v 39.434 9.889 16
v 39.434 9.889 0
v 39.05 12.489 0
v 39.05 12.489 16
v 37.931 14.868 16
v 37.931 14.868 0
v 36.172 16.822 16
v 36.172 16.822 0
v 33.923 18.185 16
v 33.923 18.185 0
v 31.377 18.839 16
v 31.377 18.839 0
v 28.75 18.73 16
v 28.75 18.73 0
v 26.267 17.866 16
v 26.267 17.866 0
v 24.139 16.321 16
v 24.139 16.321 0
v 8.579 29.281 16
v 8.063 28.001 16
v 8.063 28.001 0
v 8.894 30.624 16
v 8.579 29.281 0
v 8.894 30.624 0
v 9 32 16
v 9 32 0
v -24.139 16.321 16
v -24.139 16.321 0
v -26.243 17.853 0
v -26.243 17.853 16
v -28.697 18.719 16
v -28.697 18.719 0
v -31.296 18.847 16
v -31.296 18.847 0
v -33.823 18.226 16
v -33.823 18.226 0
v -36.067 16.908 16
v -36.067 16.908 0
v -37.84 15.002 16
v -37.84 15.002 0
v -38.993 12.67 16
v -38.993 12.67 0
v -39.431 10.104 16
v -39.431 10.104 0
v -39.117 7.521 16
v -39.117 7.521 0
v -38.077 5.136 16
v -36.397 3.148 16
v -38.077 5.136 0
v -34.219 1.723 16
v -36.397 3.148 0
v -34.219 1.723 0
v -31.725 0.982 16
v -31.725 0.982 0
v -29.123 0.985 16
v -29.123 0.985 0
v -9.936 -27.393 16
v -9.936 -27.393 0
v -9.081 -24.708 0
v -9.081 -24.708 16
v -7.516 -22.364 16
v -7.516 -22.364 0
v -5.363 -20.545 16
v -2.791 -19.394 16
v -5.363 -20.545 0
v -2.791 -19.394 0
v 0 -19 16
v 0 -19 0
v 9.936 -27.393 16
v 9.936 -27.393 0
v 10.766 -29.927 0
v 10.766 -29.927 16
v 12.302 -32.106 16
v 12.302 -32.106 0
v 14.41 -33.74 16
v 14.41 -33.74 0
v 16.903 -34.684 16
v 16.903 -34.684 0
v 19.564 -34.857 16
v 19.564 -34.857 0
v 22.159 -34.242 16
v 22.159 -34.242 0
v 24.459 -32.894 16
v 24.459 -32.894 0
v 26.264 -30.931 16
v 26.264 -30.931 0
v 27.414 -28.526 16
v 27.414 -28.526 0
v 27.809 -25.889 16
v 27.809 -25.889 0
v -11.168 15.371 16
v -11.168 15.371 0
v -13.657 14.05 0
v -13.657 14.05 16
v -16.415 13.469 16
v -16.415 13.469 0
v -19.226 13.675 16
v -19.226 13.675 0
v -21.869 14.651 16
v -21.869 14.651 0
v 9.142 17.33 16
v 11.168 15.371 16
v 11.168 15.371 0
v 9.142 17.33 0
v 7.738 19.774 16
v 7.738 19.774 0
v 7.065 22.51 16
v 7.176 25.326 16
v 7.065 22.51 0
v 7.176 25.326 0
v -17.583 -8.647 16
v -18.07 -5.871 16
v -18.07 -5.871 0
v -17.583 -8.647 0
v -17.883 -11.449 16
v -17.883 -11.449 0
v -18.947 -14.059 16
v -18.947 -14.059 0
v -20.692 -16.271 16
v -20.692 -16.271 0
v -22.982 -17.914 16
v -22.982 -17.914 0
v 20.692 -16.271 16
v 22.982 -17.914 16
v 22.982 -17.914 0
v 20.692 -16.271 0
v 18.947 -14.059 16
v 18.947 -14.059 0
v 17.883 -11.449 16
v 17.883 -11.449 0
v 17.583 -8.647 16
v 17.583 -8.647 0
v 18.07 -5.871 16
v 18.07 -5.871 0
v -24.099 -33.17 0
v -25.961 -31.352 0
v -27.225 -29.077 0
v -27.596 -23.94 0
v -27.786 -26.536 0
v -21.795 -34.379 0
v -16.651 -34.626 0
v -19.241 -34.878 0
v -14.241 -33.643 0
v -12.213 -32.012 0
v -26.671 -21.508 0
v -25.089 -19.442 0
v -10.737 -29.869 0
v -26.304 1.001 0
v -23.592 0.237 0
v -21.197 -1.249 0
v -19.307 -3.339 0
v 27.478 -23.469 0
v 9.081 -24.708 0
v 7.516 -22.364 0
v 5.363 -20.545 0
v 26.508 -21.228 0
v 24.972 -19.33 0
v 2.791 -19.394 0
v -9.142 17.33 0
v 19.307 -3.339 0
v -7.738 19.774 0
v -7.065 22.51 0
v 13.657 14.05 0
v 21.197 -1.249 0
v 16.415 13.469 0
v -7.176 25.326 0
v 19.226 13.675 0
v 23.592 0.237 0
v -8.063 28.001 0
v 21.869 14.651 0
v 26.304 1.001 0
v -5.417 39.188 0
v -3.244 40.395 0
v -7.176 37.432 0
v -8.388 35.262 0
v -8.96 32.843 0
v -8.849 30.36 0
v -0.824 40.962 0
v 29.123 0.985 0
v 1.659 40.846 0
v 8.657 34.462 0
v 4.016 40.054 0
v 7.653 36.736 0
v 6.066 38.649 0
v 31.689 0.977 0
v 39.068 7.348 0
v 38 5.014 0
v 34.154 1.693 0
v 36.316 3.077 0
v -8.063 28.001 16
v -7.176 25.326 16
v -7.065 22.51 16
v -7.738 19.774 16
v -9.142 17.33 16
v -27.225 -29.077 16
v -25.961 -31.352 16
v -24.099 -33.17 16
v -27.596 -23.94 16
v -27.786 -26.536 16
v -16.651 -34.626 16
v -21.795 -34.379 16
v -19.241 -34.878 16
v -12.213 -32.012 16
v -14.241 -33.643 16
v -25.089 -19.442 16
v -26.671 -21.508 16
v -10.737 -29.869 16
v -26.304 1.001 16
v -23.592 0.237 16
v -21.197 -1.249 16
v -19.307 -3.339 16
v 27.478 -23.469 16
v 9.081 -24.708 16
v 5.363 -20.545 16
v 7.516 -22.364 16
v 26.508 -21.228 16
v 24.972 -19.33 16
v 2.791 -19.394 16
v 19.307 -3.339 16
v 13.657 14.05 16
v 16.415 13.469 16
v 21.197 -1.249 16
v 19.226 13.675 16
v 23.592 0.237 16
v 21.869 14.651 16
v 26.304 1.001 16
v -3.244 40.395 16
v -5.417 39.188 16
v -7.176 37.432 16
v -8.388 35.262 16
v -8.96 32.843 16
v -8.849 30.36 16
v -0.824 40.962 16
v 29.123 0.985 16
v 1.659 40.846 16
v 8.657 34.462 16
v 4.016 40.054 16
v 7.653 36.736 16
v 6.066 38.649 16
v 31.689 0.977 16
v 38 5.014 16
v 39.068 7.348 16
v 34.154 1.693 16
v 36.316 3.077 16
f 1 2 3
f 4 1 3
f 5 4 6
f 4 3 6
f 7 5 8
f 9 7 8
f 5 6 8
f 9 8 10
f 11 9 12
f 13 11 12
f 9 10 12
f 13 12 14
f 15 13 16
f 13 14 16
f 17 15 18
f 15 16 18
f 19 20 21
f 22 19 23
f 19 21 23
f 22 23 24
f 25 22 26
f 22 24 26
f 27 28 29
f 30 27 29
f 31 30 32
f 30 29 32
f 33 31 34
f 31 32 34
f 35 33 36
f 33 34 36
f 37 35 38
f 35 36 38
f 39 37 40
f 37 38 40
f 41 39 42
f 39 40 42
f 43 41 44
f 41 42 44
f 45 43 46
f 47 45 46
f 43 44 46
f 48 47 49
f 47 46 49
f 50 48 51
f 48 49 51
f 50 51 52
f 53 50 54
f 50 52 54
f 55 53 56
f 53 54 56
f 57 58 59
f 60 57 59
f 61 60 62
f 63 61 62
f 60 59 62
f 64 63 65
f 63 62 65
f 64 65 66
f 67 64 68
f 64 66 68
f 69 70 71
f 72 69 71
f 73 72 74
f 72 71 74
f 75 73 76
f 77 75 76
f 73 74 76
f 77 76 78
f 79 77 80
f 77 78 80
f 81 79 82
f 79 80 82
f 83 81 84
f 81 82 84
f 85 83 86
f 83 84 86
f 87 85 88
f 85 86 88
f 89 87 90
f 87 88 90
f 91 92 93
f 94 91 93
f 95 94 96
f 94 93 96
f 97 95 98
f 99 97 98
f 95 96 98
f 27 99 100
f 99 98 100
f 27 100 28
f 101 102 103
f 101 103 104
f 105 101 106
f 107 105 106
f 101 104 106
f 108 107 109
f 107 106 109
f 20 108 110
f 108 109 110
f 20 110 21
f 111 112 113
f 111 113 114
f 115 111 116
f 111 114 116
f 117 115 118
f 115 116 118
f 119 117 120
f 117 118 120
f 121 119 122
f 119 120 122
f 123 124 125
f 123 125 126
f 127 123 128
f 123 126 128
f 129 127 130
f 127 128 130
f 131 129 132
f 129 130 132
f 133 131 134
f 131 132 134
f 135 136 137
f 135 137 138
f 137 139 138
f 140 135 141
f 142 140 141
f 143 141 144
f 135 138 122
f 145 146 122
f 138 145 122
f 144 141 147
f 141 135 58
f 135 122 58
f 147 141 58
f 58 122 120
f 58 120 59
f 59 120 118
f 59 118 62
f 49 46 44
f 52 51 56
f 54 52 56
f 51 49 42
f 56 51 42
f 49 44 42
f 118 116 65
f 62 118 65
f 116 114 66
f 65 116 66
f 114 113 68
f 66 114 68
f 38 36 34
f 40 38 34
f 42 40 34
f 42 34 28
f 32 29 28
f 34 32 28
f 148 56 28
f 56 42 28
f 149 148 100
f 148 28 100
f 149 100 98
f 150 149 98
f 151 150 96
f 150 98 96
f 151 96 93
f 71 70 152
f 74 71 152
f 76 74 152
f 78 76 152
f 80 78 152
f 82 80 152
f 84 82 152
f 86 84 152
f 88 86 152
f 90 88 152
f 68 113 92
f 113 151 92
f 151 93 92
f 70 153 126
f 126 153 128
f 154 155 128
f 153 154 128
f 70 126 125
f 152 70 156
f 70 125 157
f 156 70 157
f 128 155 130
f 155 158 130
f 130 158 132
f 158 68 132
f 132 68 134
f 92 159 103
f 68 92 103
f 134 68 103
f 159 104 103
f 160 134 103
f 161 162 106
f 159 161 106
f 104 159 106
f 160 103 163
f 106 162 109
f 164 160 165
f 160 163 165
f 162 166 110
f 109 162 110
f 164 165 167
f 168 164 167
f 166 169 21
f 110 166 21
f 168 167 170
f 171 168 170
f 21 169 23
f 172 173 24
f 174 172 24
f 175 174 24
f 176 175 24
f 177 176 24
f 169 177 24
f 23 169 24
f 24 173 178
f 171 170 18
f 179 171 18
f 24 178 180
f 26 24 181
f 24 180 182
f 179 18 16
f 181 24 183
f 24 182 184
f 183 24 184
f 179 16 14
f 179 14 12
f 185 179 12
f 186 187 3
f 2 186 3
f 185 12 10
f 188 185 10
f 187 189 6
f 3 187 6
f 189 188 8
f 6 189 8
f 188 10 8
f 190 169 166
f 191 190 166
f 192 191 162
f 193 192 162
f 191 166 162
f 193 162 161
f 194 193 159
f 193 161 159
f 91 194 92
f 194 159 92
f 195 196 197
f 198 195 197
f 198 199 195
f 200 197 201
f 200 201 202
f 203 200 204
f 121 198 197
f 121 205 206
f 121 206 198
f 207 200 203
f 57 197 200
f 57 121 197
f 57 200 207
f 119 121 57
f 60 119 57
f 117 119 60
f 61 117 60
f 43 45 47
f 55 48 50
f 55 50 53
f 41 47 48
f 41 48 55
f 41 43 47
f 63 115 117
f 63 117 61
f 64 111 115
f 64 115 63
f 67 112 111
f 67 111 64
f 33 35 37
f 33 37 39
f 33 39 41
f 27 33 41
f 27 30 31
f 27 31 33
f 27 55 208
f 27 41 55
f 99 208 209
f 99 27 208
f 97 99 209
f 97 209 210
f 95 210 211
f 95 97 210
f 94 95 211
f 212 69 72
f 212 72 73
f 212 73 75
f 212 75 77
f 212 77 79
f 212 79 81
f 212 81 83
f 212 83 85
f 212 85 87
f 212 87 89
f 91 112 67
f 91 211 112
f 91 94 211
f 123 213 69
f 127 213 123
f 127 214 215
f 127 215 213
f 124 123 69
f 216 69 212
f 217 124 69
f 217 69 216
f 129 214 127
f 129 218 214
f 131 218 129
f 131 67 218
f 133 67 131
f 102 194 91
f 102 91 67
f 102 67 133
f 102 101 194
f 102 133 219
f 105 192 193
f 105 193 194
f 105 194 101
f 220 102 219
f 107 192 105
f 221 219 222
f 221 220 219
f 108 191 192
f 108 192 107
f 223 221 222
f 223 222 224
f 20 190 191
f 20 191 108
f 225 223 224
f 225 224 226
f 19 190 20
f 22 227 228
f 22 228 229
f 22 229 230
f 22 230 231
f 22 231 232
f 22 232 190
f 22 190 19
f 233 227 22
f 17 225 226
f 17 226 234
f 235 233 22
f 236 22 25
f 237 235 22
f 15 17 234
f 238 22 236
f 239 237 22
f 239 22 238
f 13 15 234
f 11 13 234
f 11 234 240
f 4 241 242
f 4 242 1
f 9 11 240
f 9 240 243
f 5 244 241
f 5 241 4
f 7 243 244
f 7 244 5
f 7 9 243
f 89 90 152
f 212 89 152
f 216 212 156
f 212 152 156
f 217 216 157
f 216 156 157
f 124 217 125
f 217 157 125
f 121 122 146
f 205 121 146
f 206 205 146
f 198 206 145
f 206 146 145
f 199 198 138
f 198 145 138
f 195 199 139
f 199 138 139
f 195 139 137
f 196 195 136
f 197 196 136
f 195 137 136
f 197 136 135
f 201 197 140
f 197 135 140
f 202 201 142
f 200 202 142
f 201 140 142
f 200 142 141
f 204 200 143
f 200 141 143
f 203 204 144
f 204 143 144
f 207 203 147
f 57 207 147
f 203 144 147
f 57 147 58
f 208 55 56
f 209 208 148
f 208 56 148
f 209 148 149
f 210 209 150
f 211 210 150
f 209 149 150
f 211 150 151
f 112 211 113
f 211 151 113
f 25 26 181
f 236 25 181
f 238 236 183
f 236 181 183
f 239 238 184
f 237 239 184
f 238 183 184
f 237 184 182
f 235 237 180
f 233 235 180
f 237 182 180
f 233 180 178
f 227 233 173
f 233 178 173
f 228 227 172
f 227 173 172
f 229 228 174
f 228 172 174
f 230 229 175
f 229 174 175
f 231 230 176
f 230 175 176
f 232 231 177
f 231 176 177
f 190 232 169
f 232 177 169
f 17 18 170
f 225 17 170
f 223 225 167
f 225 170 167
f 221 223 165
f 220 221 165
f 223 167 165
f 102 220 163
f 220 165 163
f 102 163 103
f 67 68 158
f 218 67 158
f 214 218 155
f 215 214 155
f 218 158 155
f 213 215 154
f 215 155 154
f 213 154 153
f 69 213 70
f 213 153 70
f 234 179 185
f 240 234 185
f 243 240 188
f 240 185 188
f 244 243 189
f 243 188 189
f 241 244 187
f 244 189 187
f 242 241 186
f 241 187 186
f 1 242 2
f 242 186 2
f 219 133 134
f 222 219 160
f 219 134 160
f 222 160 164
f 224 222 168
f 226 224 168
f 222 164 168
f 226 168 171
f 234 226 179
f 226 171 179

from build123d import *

# Parameters (mm, degrees)
F1_DEPTH = 16


with BuildPart() as f1:
    # F0 (on Top) → F1 (new body)
    with BuildSketch(Plane.XY):
        with BuildLine():
            ThreePointArc((-8.062995, 28.001486), (0, 23), (8.062995, 28.001486))
            ThreePointArc((8.062995, 28.001486), (8.762618, 29.946582), (9, 32))
            ThreePointArc((9, 32), (-2.053418, 40.762618), (-8.062995, 28.001486))
        make_face()
        with BuildLine():
            ThreePointArc((39.433809, 9.888544), (33.923096, 18.184619), (24.139393, 16.321298))
            ThreePointArc((24.139393, 16.321298), (21.8743, 7.107391), (29.122598, 0.984571))
            ThreePointArc((29.122598, 0.984571), (36.315947, 3.076756), (39.433809, 9.888544))
        make_face()
        with BuildLine():
            ThreePointArc((27.809128, -25.888544), (26.508332, -21.22783), (22.98196, -17.914368))
            ThreePointArc((22.98196, -17.914368), (13.519061, -18.607391), (9.935761, -27.392987))
            ThreePointArc((9.935761, -27.392987), (19.56401, -34.85683), (27.809128, -25.888544))
        make_face()
        with BuildLine():
            ThreePointArc((-22.98196, -17.914368), (-24.099195, -33.169697), (-9.935761, -27.392987))
            ThreePointArc((-9.935761, -27.392987), (-9.840842, -26.643425), (-9.809128, -25.888544))
            ThreePointArc((-9.809128, -25.888544), (-14.148414, -18.18934), (-22.98196, -17.914368))
        make_face()
        with BuildLine():
            ThreePointArc((-21.433809, 9.888544), (-22.137733, 13.377832), (-24.139393, 16.321298))
            ThreePointArc((-24.139393, 16.321298), (-38.993317, 12.669697), (-29.122598, 0.984571))
            ThreePointArc((-29.122598, 0.984571), (-23.622021, 4.006406), (-21.433809, 9.888544))
        make_face()
        with BuildLine():
            ThreePointArc((18.070074, -5.871323), (18.766078, -2.972255), (19, 0))
            ThreePointArc((19, 0), (16.929124, 8.625819), (11.16792, 15.371323))
            ThreePointArc((11.16792, 15.371323), (0, 19), (-11.16792, 15.371323))
            ThreePointArc((-11.16792, 15.371323), (-18.070074, 5.871323), (-18.070074, -5.871323))
            ThreePointArc((-18.070074, -5.871323), (-11.16792, -15.371323), (0, -19))
            ThreePointArc((0, -19), (11.16792, -15.371323), (18.070074, -5.871323))
        make_face()
        with BuildLine():
            ThreePointArc((22.98196, -17.914368), (18.32313, -12.791317), (18.070074, -5.871323))
            ThreePointArc((18.070074, -5.871323), (11.16792, -15.371323), (0, -19))
            ThreePointArc((0, -19), (6.503106, -21.379067), (9.935761, -27.392987))
            ThreePointArc((9.935761, -27.392987), (13.519061, -18.607391), (22.98196, -17.914368))
        make_face()
        with BuildLine():
            ThreePointArc((-9.935761, -27.392987), (-6.503106, -21.379067), (0, -19))
            ThreePointArc((0, -19), (-11.16792, -15.371323), (-18.070074, -5.871323))
            ThreePointArc((-18.070074, -5.871323), (-18.32313, -12.791317), (-22.98196, -17.914368))
            ThreePointArc((-22.98196, -17.914368), (-14.148414, -18.18934), (-9.809128, -25.888544))
            ThreePointArc((-9.809128, -25.888544), (-9.840842, -26.643425), (-9.935761, -27.392987))
        make_face()
        with BuildLine():
            ThreePointArc((-18.070074, -5.871323), (-18.070074, 5.871323), (-11.16792, 15.371323))
            ThreePointArc((-11.16792, 15.371323), (-17.827424, 13.473598), (-24.139393, 16.321298))
            ThreePointArc((-24.139393, 16.321298), (-22.137733, 13.377832), (-21.433809, 9.888544))
            ThreePointArc((-21.433809, 9.888544), (-23.622021, 4.006406), (-29.122598, 0.984571))
            ThreePointArc((-29.122598, 0.984571), (-22.342271, -0.421673), (-18.070074, -5.871323))
        make_face()
        with BuildLine():
            ThreePointArc((-11.16792, 15.371323), (0, 19), (11.16792, 15.371323))
            ThreePointArc((11.16792, 15.371323), (7.305177, 21.118458), (8.062995, 28.001486))
            ThreePointArc((8.062995, 28.001486), (0, 23), (-8.062995, 28.001486))
            ThreePointArc((-8.062995, 28.001486), (-7.305177, 21.118458), (-11.16792, 15.371323))
        make_face()
        with BuildLine():
            ThreePointArc((11.16792, 15.371323), (16.929124, 8.625819), (19, 0))
            ThreePointArc((19, 0), (18.766078, -2.972255), (18.070074, -5.871323))
            ThreePointArc((18.070074, -5.871323), (22.342271, -0.421673), (29.122598, 0.984571))
            ThreePointArc((29.122598, 0.984571), (21.8743, 7.107391), (24.139393, 16.321298))
            ThreePointArc((24.139393, 16.321298), (17.827424, 13.473598), (11.16792, 15.371323))
        make_face()
    extrude(amount=F1_DEPTH)


solid = f1.part
